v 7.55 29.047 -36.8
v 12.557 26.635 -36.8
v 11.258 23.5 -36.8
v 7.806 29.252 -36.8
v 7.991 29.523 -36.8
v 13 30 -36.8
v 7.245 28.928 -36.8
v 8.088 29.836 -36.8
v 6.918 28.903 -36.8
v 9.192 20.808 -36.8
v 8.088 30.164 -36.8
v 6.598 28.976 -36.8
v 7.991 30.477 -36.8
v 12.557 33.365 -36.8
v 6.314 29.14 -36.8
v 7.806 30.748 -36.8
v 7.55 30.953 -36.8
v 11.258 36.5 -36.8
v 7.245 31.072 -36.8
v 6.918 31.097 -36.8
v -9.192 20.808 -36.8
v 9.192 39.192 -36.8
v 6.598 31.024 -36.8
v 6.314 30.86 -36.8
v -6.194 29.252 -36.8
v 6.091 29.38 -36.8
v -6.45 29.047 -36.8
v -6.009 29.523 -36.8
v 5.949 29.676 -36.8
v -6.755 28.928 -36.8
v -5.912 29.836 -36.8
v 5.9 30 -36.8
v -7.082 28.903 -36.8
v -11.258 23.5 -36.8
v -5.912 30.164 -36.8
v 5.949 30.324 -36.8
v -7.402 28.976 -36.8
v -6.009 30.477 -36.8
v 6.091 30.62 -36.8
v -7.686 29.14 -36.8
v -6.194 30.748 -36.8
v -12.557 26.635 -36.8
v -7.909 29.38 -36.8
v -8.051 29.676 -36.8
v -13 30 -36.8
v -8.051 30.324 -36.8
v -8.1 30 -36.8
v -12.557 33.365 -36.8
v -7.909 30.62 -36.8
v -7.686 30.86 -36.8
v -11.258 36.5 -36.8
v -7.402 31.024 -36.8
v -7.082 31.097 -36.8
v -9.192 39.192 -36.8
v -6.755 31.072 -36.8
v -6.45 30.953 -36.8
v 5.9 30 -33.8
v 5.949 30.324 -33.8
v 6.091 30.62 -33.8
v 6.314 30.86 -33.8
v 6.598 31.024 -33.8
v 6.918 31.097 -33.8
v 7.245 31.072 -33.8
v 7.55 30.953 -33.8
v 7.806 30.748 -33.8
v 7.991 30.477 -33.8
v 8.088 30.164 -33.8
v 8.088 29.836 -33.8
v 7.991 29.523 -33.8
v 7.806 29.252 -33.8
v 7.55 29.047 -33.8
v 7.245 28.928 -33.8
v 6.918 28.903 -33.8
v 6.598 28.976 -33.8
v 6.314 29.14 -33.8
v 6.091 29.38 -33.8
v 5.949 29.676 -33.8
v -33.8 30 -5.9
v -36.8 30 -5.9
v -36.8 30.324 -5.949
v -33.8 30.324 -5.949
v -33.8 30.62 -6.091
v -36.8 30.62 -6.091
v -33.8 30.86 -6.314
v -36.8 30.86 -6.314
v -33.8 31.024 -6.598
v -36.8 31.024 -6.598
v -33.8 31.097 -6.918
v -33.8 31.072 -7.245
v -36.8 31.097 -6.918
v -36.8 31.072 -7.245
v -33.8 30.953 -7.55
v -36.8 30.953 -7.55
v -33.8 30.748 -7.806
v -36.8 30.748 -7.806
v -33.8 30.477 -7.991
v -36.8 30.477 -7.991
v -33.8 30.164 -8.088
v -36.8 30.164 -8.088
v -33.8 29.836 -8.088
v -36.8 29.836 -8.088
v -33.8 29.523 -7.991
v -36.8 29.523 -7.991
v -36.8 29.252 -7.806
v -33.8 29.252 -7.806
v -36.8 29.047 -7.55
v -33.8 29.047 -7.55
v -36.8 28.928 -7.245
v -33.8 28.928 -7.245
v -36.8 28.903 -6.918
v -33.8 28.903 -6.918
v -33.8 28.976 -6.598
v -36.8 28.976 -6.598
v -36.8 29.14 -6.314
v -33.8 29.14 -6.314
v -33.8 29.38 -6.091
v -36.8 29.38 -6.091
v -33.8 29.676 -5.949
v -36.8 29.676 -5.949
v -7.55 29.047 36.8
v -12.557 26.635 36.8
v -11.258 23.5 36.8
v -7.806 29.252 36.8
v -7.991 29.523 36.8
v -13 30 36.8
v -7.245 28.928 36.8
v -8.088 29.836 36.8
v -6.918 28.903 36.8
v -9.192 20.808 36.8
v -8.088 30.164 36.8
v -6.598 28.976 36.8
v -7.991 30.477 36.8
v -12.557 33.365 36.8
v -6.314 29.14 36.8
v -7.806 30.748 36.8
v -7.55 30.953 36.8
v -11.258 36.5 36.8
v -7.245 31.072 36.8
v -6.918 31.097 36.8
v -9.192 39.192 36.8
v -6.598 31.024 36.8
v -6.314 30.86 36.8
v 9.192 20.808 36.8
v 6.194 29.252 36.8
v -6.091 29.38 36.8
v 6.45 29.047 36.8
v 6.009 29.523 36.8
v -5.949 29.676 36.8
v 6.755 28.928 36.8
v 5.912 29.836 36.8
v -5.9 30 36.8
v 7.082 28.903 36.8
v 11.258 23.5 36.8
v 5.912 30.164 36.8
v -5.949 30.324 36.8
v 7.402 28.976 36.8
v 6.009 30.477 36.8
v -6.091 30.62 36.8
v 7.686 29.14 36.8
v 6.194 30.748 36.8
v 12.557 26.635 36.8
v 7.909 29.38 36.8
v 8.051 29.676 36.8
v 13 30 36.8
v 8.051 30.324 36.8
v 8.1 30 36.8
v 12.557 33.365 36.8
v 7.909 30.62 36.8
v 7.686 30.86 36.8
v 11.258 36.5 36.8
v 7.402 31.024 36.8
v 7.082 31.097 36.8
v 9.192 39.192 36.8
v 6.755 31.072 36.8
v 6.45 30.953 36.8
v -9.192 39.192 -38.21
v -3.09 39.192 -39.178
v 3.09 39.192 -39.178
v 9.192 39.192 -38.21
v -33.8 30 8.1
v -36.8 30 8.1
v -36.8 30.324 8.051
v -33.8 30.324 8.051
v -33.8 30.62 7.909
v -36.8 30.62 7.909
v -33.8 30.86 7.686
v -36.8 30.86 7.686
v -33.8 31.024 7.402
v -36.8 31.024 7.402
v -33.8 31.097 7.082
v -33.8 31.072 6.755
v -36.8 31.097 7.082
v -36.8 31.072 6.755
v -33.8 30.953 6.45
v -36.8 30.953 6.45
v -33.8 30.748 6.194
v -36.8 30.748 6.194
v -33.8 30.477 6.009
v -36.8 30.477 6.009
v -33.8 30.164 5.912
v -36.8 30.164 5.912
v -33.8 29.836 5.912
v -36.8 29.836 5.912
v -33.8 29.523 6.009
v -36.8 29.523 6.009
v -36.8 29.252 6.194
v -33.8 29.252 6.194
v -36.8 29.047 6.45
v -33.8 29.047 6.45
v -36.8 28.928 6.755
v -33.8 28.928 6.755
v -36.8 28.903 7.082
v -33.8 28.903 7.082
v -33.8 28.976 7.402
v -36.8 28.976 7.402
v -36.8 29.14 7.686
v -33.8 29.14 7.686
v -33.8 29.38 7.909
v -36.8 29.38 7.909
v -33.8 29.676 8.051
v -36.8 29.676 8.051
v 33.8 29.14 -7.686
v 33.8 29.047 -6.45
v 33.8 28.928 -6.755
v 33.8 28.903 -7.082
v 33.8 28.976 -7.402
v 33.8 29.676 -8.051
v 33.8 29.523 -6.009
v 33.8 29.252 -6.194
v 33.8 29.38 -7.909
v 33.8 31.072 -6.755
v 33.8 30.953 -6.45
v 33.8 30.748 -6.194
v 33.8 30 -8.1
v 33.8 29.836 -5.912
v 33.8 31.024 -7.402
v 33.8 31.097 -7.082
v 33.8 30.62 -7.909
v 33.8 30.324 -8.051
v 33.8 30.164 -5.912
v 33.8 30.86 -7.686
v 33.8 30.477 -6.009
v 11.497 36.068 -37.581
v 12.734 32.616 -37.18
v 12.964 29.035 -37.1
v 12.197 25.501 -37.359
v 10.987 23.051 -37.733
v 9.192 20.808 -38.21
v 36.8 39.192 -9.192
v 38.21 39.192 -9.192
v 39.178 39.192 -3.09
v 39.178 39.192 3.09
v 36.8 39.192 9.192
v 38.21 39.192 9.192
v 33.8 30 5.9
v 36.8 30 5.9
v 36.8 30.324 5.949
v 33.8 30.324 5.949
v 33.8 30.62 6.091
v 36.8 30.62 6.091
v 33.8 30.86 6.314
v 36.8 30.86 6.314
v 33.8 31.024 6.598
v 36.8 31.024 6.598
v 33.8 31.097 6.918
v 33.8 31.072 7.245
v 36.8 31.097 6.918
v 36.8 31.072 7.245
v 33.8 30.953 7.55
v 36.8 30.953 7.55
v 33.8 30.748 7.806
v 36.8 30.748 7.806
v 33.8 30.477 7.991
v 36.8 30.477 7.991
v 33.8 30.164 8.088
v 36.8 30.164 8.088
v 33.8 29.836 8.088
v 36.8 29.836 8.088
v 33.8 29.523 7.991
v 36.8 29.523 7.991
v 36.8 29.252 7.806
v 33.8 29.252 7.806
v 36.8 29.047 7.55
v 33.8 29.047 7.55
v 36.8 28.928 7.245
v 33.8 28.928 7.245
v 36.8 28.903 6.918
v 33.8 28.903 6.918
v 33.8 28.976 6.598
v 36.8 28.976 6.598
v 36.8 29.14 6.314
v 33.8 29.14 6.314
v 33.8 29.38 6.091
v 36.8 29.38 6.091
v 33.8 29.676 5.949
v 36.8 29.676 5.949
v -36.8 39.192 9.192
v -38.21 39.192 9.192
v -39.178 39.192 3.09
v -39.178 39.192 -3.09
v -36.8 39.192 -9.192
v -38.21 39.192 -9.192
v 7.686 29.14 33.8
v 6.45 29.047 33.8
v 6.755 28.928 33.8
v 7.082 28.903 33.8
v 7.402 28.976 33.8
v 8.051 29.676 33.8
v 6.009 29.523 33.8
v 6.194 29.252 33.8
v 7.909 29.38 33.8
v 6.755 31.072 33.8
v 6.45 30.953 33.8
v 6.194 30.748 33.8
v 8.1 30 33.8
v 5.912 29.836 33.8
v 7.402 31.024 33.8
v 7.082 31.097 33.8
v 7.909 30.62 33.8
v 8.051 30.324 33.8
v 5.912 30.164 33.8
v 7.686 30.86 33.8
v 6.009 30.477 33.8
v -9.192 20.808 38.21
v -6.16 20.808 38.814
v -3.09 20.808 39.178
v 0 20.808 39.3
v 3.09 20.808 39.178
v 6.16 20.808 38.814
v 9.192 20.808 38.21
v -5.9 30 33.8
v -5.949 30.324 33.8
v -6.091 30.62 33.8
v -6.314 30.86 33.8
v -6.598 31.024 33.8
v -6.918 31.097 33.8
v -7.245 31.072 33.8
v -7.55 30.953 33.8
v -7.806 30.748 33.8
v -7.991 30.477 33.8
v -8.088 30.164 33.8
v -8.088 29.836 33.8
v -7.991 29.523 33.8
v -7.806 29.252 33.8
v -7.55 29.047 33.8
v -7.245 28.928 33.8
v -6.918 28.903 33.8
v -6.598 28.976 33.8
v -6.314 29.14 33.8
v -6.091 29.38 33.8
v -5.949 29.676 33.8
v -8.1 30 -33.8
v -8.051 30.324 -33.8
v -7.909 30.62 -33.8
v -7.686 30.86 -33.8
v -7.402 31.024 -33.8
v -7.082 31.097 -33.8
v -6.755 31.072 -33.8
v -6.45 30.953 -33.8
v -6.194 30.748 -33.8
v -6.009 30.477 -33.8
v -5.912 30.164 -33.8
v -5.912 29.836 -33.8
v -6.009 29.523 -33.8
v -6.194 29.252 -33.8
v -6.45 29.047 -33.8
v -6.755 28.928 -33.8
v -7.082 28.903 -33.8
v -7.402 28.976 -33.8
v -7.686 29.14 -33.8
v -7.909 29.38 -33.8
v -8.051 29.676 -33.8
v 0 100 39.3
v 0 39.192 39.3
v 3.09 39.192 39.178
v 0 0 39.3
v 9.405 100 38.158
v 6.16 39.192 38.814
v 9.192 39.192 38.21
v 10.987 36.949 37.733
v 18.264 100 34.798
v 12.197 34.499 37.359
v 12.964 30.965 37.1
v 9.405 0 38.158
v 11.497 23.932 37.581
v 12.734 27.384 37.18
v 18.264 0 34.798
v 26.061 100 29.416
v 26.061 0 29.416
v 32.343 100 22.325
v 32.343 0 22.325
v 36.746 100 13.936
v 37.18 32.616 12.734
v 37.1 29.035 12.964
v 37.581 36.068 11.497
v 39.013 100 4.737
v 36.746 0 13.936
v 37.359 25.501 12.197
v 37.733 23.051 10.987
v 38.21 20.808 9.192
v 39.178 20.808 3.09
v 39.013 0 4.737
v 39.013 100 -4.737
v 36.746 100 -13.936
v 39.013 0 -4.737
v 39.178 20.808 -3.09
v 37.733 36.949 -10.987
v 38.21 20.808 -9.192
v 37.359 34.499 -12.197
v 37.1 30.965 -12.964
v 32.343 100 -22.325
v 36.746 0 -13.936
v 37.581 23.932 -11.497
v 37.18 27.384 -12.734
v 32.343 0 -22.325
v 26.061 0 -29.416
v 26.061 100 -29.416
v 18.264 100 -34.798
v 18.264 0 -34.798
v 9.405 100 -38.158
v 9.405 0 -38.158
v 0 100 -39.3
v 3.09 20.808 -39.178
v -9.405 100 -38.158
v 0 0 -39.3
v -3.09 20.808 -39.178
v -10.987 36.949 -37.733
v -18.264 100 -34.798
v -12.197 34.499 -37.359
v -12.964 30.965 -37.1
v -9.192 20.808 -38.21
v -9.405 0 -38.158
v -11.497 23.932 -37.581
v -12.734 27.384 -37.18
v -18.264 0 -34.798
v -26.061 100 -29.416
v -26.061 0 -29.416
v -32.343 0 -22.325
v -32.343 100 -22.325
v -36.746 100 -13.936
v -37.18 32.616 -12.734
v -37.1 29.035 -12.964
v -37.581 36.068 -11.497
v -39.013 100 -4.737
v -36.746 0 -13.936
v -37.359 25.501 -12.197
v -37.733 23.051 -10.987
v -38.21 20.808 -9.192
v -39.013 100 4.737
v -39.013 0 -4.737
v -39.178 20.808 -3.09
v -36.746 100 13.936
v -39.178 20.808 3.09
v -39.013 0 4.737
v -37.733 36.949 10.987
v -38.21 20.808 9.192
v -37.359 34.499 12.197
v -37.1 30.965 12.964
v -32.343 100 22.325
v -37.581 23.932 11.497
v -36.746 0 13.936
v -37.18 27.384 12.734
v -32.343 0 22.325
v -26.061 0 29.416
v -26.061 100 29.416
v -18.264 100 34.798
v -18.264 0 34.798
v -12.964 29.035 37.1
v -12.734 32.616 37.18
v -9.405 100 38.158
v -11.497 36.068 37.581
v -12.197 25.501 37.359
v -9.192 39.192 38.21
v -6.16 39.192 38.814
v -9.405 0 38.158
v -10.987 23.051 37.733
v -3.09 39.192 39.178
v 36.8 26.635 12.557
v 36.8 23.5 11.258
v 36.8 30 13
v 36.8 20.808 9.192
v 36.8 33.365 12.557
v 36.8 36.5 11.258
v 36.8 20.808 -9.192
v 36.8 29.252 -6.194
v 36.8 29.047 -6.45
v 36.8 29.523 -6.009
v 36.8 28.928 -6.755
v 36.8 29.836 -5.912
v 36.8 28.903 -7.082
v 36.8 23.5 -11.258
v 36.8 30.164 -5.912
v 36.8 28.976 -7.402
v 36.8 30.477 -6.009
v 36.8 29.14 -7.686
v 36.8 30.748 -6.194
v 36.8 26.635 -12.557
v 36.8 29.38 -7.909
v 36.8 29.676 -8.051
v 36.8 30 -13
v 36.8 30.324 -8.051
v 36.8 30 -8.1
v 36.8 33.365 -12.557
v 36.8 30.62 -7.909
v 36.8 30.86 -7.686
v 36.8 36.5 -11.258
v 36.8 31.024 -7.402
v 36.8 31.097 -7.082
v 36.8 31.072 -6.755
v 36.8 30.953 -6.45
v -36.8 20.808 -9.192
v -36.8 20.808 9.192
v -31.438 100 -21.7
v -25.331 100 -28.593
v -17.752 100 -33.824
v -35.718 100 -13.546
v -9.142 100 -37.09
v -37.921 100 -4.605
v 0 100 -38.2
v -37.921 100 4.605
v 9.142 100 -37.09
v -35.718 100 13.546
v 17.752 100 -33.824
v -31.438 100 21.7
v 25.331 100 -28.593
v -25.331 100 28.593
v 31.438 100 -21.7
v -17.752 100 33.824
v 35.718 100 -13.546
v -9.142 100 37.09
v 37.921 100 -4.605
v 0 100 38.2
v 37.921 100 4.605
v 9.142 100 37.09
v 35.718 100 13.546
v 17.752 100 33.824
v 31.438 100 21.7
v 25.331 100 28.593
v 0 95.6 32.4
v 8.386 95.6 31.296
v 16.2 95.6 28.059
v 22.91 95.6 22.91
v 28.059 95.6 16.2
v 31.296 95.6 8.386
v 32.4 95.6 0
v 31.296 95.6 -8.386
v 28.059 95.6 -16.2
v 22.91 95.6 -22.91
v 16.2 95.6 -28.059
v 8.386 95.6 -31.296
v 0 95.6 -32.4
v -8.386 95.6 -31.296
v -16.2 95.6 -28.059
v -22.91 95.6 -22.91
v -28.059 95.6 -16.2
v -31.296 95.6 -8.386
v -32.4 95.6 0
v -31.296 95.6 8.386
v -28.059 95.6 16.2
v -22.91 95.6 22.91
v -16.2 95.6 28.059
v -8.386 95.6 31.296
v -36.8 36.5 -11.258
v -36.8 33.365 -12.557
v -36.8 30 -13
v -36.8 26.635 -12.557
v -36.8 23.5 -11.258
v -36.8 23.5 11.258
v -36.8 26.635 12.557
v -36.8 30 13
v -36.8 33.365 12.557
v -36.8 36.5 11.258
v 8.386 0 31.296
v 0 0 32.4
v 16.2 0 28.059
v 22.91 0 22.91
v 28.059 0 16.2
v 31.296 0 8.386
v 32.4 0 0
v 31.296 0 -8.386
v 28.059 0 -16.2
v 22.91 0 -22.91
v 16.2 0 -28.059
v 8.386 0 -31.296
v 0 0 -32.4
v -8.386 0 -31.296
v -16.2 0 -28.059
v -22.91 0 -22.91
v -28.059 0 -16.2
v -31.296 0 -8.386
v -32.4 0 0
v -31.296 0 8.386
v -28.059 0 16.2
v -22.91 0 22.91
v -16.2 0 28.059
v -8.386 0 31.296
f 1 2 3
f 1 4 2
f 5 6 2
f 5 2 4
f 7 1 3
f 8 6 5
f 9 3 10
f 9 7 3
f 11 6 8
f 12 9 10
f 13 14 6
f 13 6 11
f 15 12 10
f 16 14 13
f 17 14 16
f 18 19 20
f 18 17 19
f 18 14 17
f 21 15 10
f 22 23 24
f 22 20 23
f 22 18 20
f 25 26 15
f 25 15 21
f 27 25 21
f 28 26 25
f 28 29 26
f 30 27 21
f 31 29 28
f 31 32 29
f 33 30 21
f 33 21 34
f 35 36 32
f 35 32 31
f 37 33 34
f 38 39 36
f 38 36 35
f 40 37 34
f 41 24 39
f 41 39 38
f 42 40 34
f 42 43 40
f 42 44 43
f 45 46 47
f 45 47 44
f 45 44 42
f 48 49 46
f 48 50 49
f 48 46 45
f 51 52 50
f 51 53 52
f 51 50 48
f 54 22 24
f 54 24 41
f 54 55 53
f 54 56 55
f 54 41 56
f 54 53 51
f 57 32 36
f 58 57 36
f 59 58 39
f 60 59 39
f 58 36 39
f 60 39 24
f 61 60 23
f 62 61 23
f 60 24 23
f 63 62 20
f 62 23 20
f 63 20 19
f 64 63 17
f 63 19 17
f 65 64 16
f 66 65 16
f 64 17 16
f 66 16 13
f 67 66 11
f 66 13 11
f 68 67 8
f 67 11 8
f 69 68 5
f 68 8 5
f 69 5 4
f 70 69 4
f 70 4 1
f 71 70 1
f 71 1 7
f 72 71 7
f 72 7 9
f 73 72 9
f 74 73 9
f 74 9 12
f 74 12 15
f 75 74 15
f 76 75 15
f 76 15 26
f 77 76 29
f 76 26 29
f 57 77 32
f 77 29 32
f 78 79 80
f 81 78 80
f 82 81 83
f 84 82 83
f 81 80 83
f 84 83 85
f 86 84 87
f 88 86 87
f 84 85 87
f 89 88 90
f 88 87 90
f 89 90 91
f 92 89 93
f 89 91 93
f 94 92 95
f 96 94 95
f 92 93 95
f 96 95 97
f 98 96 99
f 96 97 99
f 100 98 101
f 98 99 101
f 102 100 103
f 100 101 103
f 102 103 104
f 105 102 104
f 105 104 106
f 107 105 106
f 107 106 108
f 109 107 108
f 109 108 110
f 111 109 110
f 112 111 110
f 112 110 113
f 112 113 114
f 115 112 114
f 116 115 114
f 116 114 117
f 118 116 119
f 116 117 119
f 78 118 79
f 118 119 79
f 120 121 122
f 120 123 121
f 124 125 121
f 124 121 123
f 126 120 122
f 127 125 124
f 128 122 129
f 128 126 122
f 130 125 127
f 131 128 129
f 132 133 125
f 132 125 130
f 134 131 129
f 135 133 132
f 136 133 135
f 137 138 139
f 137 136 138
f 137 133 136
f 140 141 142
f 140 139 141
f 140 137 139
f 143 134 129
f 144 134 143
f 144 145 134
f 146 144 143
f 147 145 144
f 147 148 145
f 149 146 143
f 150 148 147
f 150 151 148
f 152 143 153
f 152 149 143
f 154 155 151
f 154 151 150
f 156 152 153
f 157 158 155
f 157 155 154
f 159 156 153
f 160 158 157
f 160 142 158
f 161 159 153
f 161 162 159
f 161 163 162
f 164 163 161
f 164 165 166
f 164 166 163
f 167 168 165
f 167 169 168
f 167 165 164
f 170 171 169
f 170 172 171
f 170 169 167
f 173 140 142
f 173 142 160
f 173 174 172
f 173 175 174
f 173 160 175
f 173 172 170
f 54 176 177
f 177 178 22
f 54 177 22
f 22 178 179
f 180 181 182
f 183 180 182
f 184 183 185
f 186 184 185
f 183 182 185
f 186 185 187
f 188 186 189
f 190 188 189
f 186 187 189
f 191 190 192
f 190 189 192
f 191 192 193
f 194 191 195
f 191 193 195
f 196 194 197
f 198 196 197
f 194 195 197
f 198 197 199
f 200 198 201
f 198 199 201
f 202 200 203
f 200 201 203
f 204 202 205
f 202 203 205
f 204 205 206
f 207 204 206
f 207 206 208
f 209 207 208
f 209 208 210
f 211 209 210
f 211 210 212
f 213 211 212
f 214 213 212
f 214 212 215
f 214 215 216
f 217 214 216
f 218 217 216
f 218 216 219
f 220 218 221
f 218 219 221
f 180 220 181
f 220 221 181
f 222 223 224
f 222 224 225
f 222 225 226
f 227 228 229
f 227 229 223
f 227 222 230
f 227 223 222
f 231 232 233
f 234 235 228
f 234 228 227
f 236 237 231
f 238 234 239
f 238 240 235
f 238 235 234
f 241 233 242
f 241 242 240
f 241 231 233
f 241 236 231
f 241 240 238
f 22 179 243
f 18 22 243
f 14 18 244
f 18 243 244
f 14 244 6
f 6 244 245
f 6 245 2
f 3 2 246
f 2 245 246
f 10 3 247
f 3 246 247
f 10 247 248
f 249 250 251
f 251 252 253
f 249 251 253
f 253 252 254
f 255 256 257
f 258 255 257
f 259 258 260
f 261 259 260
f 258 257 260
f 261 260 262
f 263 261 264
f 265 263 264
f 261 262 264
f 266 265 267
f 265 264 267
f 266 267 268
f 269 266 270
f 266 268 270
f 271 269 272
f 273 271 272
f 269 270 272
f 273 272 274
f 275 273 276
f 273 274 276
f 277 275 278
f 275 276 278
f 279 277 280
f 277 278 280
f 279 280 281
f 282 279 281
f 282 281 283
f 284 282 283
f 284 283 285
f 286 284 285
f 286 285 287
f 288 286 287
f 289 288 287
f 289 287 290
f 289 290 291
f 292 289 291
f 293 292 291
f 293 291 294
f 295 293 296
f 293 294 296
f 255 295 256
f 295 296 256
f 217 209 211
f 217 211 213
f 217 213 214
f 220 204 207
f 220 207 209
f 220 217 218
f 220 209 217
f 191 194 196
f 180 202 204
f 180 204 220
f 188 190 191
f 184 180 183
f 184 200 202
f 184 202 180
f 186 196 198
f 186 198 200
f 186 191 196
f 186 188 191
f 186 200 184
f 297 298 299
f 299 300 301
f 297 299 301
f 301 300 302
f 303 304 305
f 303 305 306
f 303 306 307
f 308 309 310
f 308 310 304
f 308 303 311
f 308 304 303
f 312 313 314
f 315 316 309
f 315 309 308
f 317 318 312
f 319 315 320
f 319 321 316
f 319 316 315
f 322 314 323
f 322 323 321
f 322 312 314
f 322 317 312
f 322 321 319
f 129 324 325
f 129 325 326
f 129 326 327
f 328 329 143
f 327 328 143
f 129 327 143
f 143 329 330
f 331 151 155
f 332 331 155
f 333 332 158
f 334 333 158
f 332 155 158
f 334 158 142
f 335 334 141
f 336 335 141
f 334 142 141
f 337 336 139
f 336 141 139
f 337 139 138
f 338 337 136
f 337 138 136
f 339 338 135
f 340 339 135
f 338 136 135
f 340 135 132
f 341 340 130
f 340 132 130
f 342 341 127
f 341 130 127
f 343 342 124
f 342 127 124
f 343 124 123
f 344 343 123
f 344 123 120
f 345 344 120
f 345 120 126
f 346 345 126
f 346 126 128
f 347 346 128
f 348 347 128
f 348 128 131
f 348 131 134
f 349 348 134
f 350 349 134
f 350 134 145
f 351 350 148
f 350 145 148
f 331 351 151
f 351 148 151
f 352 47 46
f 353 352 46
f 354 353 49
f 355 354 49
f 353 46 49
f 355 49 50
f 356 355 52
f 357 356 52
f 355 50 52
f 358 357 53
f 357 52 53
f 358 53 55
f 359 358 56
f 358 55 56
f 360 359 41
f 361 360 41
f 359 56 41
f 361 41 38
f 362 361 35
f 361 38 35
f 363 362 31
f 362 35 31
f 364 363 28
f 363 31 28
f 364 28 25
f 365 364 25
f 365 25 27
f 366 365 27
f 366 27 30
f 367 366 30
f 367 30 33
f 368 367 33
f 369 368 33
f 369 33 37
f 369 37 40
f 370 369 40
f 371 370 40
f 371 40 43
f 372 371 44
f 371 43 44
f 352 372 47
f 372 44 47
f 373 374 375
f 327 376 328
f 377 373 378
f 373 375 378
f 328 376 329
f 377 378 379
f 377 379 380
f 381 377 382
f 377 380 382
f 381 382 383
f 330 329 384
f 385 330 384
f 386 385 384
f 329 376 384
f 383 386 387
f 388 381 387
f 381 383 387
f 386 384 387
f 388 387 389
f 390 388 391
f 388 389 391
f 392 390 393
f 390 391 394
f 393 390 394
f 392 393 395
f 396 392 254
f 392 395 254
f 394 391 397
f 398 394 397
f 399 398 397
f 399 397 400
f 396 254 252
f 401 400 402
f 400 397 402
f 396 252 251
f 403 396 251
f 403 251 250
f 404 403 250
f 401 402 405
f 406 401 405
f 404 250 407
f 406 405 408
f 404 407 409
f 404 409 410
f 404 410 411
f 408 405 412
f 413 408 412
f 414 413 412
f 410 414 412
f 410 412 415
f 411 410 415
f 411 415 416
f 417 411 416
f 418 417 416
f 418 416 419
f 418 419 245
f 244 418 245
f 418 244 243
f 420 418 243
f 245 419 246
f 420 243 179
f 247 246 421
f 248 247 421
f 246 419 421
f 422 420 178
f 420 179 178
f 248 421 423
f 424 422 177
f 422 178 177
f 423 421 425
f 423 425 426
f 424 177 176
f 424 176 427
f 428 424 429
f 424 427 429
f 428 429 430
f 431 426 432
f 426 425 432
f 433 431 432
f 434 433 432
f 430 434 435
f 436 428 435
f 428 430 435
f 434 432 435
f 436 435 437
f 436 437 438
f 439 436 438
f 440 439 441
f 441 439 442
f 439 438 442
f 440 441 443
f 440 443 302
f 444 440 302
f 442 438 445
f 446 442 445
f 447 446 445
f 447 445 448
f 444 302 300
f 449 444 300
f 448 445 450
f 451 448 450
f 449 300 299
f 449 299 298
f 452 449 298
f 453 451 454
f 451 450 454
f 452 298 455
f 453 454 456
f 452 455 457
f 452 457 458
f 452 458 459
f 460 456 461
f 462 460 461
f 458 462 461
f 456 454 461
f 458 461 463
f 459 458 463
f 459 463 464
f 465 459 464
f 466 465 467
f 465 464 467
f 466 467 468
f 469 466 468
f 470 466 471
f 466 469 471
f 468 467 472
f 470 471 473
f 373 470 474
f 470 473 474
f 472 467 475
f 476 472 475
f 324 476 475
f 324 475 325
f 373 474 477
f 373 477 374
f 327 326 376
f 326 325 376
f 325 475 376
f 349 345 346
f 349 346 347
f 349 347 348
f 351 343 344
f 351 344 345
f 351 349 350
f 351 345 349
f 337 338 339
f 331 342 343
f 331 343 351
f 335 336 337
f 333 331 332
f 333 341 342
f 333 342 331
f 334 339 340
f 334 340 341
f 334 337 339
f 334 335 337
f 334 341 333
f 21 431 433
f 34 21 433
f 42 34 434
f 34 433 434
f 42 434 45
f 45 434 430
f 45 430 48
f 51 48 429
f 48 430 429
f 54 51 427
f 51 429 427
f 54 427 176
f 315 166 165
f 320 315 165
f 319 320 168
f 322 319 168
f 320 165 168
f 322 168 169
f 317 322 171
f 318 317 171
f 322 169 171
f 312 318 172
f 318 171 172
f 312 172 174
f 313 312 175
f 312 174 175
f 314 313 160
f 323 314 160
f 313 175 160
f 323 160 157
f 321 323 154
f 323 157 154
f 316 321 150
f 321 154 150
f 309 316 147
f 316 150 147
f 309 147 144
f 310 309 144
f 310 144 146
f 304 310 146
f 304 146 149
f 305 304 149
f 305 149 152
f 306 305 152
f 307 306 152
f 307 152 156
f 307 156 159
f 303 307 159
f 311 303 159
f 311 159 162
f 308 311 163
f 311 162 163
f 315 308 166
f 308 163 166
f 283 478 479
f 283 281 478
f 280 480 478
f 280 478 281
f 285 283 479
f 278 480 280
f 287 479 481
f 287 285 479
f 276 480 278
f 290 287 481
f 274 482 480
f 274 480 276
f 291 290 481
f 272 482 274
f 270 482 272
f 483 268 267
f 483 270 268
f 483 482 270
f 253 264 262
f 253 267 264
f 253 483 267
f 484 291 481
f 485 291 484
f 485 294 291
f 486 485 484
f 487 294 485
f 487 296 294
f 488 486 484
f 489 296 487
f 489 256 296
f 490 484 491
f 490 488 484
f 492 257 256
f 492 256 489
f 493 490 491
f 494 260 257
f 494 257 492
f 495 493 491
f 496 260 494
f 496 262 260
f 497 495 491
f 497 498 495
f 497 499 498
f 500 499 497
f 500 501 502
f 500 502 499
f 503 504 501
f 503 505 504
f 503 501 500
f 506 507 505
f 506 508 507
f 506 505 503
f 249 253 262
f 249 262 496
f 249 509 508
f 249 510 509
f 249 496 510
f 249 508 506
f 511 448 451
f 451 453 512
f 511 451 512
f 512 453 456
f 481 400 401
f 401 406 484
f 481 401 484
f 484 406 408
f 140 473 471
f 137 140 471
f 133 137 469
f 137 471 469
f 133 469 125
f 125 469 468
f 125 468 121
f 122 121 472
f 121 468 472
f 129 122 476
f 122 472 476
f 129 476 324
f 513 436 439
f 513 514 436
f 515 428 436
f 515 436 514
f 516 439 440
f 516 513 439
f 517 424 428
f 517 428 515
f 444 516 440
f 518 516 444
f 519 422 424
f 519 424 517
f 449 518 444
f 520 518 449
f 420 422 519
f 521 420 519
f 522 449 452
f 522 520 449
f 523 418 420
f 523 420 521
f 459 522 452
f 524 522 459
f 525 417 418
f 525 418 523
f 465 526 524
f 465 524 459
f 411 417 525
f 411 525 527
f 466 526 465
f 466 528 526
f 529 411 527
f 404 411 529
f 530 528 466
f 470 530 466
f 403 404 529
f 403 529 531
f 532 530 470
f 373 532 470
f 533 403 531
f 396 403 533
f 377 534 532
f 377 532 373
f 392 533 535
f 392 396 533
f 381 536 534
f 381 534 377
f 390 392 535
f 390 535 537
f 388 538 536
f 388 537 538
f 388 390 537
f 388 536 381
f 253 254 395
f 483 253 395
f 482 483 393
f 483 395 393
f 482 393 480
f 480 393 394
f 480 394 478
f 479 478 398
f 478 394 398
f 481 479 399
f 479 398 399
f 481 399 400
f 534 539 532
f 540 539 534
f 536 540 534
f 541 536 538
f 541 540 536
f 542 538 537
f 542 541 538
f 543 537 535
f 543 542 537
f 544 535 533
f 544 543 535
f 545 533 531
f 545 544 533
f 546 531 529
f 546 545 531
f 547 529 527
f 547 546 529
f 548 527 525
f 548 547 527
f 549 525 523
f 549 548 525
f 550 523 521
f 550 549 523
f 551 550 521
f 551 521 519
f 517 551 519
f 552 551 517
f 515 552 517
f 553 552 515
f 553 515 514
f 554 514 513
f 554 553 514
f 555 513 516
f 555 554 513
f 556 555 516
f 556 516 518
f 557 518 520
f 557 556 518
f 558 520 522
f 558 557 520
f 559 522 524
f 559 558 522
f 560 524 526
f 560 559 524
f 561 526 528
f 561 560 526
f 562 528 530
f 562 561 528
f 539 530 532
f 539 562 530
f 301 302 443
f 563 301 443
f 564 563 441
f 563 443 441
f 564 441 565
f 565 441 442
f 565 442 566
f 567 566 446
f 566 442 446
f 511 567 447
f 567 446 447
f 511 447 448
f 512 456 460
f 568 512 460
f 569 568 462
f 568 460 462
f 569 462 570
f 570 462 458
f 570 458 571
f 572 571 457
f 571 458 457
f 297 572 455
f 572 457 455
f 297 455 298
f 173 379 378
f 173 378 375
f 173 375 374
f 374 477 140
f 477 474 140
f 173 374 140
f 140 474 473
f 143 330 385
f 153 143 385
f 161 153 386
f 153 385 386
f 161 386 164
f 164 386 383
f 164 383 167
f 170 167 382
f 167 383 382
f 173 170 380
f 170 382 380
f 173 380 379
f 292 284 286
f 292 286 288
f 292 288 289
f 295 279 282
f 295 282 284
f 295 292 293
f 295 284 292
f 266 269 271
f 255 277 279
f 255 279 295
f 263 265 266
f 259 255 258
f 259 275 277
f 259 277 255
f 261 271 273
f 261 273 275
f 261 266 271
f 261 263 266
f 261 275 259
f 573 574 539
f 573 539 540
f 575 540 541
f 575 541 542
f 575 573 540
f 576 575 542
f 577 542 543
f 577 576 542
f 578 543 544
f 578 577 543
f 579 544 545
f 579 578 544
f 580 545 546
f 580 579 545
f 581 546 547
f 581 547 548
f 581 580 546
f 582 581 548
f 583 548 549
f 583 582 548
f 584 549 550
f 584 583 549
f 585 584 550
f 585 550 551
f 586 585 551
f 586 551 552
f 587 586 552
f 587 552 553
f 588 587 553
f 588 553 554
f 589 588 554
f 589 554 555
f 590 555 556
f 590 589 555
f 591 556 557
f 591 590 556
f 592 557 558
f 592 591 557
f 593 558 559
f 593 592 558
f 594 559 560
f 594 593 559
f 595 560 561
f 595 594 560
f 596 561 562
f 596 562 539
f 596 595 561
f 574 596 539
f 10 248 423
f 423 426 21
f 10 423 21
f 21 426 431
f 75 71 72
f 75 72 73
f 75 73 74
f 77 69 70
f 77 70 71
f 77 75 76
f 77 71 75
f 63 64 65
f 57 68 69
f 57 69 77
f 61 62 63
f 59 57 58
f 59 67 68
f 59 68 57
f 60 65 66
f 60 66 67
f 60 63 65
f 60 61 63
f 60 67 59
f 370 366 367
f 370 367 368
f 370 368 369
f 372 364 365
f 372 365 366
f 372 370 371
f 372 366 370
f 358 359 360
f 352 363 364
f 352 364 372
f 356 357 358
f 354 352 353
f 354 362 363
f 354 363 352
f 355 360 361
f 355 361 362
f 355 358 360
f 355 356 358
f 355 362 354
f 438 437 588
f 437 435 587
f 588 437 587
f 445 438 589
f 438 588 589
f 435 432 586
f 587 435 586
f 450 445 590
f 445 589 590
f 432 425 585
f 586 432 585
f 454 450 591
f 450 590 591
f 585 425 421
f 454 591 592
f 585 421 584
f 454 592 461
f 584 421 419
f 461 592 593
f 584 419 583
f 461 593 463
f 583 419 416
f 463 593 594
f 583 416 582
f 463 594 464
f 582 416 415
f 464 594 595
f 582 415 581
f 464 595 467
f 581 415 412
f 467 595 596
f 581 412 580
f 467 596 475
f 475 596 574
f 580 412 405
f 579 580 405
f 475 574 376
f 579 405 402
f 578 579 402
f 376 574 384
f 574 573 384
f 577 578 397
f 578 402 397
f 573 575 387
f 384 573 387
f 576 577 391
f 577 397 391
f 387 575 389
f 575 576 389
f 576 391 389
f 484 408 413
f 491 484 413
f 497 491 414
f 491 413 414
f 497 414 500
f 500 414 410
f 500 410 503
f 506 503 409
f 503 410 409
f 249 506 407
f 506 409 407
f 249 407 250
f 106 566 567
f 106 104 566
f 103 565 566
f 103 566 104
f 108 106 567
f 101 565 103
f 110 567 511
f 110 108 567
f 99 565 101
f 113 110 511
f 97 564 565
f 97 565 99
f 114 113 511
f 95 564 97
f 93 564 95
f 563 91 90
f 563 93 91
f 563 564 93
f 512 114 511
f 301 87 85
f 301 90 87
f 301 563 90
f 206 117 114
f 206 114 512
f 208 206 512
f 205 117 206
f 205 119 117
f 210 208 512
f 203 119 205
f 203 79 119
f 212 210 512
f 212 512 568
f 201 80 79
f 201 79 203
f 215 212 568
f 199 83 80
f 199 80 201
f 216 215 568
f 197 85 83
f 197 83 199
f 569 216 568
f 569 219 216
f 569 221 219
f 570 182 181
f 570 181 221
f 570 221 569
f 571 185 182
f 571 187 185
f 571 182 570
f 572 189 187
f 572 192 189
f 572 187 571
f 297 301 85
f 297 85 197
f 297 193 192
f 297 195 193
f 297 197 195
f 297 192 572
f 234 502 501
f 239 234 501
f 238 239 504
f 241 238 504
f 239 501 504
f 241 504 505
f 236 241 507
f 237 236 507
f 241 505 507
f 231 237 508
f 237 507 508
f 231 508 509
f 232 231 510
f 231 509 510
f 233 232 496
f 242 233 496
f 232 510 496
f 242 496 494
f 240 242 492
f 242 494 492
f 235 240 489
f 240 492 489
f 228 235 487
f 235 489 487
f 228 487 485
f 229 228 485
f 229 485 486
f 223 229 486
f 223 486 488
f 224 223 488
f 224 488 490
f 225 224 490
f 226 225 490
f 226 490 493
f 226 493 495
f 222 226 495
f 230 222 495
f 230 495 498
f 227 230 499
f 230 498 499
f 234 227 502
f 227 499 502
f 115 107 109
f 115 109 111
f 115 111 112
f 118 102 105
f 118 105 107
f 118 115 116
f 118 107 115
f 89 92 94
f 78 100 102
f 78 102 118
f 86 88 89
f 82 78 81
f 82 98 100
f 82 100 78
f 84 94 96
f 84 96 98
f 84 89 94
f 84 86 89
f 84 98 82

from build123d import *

# Parameters (mm, degrees)
SKETCH2_R           = 39.3
SKETCH2_R_2         = 32.4
BOSS_EXTRUDE1_DEPTH = 100
CUT_EXTRUDE1_START  = 39.3
CUT_EXTRUDE1_DEPTH  = 2.5
SKETCH4_R           = 1.1
CUT_EXTRUDE2_DEPTH  = 3
CIRPATTERN1_COUNT   = 4
CHAMFER1_SIZE       = 5.8
CHAMFER1_SIZE2      = 4.4


with BuildPart() as part:
    # Sketch2 → Boss-Extrude1 (new body)
    with BuildSketch(Plane(origin=(0, 0, 0), x_dir=(1, 0, 0), z_dir=(0, 1, 0))):
        Circle(SKETCH2_R)
        Circle(SKETCH2_R_2, mode=Mode.SUBTRACT)
    extrude(amount=BOSS_EXTRUDE1_DEPTH)

    # Sketch3 → Cut-Extrude1 (cut)
    with BuildSketch(Plane.XY.offset(CUT_EXTRUDE1_START)):
        with BuildLine():
            Line((9.192388155, 39.192388155), (-9.192388155, 39.192388155))
            ThreePointArc((-9.192388155, 39.192388155), (-13, 30), (-9.192388155, 20.807611845))
            Line((-9.192388155, 20.807611845), (9.192388155, 20.807611845))
            ThreePointArc((9.192388155, 20.807611845), (13, 30), (9.192388155, 39.192388155))
        make_face()
    cut_extrude1 = extrude(amount=-CUT_EXTRUDE1_DEPTH, mode=Mode.SUBTRACT)

    # Sketch4 → Cut-Extrude2 (cut)
    with BuildSketch(Plane.XY.offset(36.8)):
        with Locations((7, 30)):
            Circle(SKETCH4_R)
        with Locations((-7, 30)):
            Circle(SKETCH4_R)
    cut_extrude2 = extrude(amount=-CUT_EXTRUDE2_DEPTH, mode=Mode.SUBTRACT)

    # CirPattern1: Cut-Extrude1, Cut-Extrude2 ×4 about axis
    cirpattern1_axis = Axis((0, 100, 0), (0, -1, 0))
    add([cut_extrude1.rotate(cirpattern1_axis, i * 360 / CIRPATTERN1_COUNT) for i in range(1, CIRPATTERN1_COUNT)], mode=Mode.SUBTRACT)
    add([cut_extrude2.rotate(cirpattern1_axis, i * 360 / CIRPATTERN1_COUNT) for i in range(1, CIRPATTERN1_COUNT)], mode=Mode.SUBTRACT)

    # Chamfer1
    chamfer1_edges = [part.edges().sort_by_distance(p)[0] for p in [
        (-32.4, 100, 0),
    ]]
    chamfer1_side = [part.faces().sort_by_distance(p)[0] for p in [
        (-38.18842814, 100, 0),
    ]]
    chamfer(chamfer1_edges, length=CHAMFER1_SIZE, length2=CHAMFER1_SIZE2, reference=chamfer1_side[0])


solid = part.part
